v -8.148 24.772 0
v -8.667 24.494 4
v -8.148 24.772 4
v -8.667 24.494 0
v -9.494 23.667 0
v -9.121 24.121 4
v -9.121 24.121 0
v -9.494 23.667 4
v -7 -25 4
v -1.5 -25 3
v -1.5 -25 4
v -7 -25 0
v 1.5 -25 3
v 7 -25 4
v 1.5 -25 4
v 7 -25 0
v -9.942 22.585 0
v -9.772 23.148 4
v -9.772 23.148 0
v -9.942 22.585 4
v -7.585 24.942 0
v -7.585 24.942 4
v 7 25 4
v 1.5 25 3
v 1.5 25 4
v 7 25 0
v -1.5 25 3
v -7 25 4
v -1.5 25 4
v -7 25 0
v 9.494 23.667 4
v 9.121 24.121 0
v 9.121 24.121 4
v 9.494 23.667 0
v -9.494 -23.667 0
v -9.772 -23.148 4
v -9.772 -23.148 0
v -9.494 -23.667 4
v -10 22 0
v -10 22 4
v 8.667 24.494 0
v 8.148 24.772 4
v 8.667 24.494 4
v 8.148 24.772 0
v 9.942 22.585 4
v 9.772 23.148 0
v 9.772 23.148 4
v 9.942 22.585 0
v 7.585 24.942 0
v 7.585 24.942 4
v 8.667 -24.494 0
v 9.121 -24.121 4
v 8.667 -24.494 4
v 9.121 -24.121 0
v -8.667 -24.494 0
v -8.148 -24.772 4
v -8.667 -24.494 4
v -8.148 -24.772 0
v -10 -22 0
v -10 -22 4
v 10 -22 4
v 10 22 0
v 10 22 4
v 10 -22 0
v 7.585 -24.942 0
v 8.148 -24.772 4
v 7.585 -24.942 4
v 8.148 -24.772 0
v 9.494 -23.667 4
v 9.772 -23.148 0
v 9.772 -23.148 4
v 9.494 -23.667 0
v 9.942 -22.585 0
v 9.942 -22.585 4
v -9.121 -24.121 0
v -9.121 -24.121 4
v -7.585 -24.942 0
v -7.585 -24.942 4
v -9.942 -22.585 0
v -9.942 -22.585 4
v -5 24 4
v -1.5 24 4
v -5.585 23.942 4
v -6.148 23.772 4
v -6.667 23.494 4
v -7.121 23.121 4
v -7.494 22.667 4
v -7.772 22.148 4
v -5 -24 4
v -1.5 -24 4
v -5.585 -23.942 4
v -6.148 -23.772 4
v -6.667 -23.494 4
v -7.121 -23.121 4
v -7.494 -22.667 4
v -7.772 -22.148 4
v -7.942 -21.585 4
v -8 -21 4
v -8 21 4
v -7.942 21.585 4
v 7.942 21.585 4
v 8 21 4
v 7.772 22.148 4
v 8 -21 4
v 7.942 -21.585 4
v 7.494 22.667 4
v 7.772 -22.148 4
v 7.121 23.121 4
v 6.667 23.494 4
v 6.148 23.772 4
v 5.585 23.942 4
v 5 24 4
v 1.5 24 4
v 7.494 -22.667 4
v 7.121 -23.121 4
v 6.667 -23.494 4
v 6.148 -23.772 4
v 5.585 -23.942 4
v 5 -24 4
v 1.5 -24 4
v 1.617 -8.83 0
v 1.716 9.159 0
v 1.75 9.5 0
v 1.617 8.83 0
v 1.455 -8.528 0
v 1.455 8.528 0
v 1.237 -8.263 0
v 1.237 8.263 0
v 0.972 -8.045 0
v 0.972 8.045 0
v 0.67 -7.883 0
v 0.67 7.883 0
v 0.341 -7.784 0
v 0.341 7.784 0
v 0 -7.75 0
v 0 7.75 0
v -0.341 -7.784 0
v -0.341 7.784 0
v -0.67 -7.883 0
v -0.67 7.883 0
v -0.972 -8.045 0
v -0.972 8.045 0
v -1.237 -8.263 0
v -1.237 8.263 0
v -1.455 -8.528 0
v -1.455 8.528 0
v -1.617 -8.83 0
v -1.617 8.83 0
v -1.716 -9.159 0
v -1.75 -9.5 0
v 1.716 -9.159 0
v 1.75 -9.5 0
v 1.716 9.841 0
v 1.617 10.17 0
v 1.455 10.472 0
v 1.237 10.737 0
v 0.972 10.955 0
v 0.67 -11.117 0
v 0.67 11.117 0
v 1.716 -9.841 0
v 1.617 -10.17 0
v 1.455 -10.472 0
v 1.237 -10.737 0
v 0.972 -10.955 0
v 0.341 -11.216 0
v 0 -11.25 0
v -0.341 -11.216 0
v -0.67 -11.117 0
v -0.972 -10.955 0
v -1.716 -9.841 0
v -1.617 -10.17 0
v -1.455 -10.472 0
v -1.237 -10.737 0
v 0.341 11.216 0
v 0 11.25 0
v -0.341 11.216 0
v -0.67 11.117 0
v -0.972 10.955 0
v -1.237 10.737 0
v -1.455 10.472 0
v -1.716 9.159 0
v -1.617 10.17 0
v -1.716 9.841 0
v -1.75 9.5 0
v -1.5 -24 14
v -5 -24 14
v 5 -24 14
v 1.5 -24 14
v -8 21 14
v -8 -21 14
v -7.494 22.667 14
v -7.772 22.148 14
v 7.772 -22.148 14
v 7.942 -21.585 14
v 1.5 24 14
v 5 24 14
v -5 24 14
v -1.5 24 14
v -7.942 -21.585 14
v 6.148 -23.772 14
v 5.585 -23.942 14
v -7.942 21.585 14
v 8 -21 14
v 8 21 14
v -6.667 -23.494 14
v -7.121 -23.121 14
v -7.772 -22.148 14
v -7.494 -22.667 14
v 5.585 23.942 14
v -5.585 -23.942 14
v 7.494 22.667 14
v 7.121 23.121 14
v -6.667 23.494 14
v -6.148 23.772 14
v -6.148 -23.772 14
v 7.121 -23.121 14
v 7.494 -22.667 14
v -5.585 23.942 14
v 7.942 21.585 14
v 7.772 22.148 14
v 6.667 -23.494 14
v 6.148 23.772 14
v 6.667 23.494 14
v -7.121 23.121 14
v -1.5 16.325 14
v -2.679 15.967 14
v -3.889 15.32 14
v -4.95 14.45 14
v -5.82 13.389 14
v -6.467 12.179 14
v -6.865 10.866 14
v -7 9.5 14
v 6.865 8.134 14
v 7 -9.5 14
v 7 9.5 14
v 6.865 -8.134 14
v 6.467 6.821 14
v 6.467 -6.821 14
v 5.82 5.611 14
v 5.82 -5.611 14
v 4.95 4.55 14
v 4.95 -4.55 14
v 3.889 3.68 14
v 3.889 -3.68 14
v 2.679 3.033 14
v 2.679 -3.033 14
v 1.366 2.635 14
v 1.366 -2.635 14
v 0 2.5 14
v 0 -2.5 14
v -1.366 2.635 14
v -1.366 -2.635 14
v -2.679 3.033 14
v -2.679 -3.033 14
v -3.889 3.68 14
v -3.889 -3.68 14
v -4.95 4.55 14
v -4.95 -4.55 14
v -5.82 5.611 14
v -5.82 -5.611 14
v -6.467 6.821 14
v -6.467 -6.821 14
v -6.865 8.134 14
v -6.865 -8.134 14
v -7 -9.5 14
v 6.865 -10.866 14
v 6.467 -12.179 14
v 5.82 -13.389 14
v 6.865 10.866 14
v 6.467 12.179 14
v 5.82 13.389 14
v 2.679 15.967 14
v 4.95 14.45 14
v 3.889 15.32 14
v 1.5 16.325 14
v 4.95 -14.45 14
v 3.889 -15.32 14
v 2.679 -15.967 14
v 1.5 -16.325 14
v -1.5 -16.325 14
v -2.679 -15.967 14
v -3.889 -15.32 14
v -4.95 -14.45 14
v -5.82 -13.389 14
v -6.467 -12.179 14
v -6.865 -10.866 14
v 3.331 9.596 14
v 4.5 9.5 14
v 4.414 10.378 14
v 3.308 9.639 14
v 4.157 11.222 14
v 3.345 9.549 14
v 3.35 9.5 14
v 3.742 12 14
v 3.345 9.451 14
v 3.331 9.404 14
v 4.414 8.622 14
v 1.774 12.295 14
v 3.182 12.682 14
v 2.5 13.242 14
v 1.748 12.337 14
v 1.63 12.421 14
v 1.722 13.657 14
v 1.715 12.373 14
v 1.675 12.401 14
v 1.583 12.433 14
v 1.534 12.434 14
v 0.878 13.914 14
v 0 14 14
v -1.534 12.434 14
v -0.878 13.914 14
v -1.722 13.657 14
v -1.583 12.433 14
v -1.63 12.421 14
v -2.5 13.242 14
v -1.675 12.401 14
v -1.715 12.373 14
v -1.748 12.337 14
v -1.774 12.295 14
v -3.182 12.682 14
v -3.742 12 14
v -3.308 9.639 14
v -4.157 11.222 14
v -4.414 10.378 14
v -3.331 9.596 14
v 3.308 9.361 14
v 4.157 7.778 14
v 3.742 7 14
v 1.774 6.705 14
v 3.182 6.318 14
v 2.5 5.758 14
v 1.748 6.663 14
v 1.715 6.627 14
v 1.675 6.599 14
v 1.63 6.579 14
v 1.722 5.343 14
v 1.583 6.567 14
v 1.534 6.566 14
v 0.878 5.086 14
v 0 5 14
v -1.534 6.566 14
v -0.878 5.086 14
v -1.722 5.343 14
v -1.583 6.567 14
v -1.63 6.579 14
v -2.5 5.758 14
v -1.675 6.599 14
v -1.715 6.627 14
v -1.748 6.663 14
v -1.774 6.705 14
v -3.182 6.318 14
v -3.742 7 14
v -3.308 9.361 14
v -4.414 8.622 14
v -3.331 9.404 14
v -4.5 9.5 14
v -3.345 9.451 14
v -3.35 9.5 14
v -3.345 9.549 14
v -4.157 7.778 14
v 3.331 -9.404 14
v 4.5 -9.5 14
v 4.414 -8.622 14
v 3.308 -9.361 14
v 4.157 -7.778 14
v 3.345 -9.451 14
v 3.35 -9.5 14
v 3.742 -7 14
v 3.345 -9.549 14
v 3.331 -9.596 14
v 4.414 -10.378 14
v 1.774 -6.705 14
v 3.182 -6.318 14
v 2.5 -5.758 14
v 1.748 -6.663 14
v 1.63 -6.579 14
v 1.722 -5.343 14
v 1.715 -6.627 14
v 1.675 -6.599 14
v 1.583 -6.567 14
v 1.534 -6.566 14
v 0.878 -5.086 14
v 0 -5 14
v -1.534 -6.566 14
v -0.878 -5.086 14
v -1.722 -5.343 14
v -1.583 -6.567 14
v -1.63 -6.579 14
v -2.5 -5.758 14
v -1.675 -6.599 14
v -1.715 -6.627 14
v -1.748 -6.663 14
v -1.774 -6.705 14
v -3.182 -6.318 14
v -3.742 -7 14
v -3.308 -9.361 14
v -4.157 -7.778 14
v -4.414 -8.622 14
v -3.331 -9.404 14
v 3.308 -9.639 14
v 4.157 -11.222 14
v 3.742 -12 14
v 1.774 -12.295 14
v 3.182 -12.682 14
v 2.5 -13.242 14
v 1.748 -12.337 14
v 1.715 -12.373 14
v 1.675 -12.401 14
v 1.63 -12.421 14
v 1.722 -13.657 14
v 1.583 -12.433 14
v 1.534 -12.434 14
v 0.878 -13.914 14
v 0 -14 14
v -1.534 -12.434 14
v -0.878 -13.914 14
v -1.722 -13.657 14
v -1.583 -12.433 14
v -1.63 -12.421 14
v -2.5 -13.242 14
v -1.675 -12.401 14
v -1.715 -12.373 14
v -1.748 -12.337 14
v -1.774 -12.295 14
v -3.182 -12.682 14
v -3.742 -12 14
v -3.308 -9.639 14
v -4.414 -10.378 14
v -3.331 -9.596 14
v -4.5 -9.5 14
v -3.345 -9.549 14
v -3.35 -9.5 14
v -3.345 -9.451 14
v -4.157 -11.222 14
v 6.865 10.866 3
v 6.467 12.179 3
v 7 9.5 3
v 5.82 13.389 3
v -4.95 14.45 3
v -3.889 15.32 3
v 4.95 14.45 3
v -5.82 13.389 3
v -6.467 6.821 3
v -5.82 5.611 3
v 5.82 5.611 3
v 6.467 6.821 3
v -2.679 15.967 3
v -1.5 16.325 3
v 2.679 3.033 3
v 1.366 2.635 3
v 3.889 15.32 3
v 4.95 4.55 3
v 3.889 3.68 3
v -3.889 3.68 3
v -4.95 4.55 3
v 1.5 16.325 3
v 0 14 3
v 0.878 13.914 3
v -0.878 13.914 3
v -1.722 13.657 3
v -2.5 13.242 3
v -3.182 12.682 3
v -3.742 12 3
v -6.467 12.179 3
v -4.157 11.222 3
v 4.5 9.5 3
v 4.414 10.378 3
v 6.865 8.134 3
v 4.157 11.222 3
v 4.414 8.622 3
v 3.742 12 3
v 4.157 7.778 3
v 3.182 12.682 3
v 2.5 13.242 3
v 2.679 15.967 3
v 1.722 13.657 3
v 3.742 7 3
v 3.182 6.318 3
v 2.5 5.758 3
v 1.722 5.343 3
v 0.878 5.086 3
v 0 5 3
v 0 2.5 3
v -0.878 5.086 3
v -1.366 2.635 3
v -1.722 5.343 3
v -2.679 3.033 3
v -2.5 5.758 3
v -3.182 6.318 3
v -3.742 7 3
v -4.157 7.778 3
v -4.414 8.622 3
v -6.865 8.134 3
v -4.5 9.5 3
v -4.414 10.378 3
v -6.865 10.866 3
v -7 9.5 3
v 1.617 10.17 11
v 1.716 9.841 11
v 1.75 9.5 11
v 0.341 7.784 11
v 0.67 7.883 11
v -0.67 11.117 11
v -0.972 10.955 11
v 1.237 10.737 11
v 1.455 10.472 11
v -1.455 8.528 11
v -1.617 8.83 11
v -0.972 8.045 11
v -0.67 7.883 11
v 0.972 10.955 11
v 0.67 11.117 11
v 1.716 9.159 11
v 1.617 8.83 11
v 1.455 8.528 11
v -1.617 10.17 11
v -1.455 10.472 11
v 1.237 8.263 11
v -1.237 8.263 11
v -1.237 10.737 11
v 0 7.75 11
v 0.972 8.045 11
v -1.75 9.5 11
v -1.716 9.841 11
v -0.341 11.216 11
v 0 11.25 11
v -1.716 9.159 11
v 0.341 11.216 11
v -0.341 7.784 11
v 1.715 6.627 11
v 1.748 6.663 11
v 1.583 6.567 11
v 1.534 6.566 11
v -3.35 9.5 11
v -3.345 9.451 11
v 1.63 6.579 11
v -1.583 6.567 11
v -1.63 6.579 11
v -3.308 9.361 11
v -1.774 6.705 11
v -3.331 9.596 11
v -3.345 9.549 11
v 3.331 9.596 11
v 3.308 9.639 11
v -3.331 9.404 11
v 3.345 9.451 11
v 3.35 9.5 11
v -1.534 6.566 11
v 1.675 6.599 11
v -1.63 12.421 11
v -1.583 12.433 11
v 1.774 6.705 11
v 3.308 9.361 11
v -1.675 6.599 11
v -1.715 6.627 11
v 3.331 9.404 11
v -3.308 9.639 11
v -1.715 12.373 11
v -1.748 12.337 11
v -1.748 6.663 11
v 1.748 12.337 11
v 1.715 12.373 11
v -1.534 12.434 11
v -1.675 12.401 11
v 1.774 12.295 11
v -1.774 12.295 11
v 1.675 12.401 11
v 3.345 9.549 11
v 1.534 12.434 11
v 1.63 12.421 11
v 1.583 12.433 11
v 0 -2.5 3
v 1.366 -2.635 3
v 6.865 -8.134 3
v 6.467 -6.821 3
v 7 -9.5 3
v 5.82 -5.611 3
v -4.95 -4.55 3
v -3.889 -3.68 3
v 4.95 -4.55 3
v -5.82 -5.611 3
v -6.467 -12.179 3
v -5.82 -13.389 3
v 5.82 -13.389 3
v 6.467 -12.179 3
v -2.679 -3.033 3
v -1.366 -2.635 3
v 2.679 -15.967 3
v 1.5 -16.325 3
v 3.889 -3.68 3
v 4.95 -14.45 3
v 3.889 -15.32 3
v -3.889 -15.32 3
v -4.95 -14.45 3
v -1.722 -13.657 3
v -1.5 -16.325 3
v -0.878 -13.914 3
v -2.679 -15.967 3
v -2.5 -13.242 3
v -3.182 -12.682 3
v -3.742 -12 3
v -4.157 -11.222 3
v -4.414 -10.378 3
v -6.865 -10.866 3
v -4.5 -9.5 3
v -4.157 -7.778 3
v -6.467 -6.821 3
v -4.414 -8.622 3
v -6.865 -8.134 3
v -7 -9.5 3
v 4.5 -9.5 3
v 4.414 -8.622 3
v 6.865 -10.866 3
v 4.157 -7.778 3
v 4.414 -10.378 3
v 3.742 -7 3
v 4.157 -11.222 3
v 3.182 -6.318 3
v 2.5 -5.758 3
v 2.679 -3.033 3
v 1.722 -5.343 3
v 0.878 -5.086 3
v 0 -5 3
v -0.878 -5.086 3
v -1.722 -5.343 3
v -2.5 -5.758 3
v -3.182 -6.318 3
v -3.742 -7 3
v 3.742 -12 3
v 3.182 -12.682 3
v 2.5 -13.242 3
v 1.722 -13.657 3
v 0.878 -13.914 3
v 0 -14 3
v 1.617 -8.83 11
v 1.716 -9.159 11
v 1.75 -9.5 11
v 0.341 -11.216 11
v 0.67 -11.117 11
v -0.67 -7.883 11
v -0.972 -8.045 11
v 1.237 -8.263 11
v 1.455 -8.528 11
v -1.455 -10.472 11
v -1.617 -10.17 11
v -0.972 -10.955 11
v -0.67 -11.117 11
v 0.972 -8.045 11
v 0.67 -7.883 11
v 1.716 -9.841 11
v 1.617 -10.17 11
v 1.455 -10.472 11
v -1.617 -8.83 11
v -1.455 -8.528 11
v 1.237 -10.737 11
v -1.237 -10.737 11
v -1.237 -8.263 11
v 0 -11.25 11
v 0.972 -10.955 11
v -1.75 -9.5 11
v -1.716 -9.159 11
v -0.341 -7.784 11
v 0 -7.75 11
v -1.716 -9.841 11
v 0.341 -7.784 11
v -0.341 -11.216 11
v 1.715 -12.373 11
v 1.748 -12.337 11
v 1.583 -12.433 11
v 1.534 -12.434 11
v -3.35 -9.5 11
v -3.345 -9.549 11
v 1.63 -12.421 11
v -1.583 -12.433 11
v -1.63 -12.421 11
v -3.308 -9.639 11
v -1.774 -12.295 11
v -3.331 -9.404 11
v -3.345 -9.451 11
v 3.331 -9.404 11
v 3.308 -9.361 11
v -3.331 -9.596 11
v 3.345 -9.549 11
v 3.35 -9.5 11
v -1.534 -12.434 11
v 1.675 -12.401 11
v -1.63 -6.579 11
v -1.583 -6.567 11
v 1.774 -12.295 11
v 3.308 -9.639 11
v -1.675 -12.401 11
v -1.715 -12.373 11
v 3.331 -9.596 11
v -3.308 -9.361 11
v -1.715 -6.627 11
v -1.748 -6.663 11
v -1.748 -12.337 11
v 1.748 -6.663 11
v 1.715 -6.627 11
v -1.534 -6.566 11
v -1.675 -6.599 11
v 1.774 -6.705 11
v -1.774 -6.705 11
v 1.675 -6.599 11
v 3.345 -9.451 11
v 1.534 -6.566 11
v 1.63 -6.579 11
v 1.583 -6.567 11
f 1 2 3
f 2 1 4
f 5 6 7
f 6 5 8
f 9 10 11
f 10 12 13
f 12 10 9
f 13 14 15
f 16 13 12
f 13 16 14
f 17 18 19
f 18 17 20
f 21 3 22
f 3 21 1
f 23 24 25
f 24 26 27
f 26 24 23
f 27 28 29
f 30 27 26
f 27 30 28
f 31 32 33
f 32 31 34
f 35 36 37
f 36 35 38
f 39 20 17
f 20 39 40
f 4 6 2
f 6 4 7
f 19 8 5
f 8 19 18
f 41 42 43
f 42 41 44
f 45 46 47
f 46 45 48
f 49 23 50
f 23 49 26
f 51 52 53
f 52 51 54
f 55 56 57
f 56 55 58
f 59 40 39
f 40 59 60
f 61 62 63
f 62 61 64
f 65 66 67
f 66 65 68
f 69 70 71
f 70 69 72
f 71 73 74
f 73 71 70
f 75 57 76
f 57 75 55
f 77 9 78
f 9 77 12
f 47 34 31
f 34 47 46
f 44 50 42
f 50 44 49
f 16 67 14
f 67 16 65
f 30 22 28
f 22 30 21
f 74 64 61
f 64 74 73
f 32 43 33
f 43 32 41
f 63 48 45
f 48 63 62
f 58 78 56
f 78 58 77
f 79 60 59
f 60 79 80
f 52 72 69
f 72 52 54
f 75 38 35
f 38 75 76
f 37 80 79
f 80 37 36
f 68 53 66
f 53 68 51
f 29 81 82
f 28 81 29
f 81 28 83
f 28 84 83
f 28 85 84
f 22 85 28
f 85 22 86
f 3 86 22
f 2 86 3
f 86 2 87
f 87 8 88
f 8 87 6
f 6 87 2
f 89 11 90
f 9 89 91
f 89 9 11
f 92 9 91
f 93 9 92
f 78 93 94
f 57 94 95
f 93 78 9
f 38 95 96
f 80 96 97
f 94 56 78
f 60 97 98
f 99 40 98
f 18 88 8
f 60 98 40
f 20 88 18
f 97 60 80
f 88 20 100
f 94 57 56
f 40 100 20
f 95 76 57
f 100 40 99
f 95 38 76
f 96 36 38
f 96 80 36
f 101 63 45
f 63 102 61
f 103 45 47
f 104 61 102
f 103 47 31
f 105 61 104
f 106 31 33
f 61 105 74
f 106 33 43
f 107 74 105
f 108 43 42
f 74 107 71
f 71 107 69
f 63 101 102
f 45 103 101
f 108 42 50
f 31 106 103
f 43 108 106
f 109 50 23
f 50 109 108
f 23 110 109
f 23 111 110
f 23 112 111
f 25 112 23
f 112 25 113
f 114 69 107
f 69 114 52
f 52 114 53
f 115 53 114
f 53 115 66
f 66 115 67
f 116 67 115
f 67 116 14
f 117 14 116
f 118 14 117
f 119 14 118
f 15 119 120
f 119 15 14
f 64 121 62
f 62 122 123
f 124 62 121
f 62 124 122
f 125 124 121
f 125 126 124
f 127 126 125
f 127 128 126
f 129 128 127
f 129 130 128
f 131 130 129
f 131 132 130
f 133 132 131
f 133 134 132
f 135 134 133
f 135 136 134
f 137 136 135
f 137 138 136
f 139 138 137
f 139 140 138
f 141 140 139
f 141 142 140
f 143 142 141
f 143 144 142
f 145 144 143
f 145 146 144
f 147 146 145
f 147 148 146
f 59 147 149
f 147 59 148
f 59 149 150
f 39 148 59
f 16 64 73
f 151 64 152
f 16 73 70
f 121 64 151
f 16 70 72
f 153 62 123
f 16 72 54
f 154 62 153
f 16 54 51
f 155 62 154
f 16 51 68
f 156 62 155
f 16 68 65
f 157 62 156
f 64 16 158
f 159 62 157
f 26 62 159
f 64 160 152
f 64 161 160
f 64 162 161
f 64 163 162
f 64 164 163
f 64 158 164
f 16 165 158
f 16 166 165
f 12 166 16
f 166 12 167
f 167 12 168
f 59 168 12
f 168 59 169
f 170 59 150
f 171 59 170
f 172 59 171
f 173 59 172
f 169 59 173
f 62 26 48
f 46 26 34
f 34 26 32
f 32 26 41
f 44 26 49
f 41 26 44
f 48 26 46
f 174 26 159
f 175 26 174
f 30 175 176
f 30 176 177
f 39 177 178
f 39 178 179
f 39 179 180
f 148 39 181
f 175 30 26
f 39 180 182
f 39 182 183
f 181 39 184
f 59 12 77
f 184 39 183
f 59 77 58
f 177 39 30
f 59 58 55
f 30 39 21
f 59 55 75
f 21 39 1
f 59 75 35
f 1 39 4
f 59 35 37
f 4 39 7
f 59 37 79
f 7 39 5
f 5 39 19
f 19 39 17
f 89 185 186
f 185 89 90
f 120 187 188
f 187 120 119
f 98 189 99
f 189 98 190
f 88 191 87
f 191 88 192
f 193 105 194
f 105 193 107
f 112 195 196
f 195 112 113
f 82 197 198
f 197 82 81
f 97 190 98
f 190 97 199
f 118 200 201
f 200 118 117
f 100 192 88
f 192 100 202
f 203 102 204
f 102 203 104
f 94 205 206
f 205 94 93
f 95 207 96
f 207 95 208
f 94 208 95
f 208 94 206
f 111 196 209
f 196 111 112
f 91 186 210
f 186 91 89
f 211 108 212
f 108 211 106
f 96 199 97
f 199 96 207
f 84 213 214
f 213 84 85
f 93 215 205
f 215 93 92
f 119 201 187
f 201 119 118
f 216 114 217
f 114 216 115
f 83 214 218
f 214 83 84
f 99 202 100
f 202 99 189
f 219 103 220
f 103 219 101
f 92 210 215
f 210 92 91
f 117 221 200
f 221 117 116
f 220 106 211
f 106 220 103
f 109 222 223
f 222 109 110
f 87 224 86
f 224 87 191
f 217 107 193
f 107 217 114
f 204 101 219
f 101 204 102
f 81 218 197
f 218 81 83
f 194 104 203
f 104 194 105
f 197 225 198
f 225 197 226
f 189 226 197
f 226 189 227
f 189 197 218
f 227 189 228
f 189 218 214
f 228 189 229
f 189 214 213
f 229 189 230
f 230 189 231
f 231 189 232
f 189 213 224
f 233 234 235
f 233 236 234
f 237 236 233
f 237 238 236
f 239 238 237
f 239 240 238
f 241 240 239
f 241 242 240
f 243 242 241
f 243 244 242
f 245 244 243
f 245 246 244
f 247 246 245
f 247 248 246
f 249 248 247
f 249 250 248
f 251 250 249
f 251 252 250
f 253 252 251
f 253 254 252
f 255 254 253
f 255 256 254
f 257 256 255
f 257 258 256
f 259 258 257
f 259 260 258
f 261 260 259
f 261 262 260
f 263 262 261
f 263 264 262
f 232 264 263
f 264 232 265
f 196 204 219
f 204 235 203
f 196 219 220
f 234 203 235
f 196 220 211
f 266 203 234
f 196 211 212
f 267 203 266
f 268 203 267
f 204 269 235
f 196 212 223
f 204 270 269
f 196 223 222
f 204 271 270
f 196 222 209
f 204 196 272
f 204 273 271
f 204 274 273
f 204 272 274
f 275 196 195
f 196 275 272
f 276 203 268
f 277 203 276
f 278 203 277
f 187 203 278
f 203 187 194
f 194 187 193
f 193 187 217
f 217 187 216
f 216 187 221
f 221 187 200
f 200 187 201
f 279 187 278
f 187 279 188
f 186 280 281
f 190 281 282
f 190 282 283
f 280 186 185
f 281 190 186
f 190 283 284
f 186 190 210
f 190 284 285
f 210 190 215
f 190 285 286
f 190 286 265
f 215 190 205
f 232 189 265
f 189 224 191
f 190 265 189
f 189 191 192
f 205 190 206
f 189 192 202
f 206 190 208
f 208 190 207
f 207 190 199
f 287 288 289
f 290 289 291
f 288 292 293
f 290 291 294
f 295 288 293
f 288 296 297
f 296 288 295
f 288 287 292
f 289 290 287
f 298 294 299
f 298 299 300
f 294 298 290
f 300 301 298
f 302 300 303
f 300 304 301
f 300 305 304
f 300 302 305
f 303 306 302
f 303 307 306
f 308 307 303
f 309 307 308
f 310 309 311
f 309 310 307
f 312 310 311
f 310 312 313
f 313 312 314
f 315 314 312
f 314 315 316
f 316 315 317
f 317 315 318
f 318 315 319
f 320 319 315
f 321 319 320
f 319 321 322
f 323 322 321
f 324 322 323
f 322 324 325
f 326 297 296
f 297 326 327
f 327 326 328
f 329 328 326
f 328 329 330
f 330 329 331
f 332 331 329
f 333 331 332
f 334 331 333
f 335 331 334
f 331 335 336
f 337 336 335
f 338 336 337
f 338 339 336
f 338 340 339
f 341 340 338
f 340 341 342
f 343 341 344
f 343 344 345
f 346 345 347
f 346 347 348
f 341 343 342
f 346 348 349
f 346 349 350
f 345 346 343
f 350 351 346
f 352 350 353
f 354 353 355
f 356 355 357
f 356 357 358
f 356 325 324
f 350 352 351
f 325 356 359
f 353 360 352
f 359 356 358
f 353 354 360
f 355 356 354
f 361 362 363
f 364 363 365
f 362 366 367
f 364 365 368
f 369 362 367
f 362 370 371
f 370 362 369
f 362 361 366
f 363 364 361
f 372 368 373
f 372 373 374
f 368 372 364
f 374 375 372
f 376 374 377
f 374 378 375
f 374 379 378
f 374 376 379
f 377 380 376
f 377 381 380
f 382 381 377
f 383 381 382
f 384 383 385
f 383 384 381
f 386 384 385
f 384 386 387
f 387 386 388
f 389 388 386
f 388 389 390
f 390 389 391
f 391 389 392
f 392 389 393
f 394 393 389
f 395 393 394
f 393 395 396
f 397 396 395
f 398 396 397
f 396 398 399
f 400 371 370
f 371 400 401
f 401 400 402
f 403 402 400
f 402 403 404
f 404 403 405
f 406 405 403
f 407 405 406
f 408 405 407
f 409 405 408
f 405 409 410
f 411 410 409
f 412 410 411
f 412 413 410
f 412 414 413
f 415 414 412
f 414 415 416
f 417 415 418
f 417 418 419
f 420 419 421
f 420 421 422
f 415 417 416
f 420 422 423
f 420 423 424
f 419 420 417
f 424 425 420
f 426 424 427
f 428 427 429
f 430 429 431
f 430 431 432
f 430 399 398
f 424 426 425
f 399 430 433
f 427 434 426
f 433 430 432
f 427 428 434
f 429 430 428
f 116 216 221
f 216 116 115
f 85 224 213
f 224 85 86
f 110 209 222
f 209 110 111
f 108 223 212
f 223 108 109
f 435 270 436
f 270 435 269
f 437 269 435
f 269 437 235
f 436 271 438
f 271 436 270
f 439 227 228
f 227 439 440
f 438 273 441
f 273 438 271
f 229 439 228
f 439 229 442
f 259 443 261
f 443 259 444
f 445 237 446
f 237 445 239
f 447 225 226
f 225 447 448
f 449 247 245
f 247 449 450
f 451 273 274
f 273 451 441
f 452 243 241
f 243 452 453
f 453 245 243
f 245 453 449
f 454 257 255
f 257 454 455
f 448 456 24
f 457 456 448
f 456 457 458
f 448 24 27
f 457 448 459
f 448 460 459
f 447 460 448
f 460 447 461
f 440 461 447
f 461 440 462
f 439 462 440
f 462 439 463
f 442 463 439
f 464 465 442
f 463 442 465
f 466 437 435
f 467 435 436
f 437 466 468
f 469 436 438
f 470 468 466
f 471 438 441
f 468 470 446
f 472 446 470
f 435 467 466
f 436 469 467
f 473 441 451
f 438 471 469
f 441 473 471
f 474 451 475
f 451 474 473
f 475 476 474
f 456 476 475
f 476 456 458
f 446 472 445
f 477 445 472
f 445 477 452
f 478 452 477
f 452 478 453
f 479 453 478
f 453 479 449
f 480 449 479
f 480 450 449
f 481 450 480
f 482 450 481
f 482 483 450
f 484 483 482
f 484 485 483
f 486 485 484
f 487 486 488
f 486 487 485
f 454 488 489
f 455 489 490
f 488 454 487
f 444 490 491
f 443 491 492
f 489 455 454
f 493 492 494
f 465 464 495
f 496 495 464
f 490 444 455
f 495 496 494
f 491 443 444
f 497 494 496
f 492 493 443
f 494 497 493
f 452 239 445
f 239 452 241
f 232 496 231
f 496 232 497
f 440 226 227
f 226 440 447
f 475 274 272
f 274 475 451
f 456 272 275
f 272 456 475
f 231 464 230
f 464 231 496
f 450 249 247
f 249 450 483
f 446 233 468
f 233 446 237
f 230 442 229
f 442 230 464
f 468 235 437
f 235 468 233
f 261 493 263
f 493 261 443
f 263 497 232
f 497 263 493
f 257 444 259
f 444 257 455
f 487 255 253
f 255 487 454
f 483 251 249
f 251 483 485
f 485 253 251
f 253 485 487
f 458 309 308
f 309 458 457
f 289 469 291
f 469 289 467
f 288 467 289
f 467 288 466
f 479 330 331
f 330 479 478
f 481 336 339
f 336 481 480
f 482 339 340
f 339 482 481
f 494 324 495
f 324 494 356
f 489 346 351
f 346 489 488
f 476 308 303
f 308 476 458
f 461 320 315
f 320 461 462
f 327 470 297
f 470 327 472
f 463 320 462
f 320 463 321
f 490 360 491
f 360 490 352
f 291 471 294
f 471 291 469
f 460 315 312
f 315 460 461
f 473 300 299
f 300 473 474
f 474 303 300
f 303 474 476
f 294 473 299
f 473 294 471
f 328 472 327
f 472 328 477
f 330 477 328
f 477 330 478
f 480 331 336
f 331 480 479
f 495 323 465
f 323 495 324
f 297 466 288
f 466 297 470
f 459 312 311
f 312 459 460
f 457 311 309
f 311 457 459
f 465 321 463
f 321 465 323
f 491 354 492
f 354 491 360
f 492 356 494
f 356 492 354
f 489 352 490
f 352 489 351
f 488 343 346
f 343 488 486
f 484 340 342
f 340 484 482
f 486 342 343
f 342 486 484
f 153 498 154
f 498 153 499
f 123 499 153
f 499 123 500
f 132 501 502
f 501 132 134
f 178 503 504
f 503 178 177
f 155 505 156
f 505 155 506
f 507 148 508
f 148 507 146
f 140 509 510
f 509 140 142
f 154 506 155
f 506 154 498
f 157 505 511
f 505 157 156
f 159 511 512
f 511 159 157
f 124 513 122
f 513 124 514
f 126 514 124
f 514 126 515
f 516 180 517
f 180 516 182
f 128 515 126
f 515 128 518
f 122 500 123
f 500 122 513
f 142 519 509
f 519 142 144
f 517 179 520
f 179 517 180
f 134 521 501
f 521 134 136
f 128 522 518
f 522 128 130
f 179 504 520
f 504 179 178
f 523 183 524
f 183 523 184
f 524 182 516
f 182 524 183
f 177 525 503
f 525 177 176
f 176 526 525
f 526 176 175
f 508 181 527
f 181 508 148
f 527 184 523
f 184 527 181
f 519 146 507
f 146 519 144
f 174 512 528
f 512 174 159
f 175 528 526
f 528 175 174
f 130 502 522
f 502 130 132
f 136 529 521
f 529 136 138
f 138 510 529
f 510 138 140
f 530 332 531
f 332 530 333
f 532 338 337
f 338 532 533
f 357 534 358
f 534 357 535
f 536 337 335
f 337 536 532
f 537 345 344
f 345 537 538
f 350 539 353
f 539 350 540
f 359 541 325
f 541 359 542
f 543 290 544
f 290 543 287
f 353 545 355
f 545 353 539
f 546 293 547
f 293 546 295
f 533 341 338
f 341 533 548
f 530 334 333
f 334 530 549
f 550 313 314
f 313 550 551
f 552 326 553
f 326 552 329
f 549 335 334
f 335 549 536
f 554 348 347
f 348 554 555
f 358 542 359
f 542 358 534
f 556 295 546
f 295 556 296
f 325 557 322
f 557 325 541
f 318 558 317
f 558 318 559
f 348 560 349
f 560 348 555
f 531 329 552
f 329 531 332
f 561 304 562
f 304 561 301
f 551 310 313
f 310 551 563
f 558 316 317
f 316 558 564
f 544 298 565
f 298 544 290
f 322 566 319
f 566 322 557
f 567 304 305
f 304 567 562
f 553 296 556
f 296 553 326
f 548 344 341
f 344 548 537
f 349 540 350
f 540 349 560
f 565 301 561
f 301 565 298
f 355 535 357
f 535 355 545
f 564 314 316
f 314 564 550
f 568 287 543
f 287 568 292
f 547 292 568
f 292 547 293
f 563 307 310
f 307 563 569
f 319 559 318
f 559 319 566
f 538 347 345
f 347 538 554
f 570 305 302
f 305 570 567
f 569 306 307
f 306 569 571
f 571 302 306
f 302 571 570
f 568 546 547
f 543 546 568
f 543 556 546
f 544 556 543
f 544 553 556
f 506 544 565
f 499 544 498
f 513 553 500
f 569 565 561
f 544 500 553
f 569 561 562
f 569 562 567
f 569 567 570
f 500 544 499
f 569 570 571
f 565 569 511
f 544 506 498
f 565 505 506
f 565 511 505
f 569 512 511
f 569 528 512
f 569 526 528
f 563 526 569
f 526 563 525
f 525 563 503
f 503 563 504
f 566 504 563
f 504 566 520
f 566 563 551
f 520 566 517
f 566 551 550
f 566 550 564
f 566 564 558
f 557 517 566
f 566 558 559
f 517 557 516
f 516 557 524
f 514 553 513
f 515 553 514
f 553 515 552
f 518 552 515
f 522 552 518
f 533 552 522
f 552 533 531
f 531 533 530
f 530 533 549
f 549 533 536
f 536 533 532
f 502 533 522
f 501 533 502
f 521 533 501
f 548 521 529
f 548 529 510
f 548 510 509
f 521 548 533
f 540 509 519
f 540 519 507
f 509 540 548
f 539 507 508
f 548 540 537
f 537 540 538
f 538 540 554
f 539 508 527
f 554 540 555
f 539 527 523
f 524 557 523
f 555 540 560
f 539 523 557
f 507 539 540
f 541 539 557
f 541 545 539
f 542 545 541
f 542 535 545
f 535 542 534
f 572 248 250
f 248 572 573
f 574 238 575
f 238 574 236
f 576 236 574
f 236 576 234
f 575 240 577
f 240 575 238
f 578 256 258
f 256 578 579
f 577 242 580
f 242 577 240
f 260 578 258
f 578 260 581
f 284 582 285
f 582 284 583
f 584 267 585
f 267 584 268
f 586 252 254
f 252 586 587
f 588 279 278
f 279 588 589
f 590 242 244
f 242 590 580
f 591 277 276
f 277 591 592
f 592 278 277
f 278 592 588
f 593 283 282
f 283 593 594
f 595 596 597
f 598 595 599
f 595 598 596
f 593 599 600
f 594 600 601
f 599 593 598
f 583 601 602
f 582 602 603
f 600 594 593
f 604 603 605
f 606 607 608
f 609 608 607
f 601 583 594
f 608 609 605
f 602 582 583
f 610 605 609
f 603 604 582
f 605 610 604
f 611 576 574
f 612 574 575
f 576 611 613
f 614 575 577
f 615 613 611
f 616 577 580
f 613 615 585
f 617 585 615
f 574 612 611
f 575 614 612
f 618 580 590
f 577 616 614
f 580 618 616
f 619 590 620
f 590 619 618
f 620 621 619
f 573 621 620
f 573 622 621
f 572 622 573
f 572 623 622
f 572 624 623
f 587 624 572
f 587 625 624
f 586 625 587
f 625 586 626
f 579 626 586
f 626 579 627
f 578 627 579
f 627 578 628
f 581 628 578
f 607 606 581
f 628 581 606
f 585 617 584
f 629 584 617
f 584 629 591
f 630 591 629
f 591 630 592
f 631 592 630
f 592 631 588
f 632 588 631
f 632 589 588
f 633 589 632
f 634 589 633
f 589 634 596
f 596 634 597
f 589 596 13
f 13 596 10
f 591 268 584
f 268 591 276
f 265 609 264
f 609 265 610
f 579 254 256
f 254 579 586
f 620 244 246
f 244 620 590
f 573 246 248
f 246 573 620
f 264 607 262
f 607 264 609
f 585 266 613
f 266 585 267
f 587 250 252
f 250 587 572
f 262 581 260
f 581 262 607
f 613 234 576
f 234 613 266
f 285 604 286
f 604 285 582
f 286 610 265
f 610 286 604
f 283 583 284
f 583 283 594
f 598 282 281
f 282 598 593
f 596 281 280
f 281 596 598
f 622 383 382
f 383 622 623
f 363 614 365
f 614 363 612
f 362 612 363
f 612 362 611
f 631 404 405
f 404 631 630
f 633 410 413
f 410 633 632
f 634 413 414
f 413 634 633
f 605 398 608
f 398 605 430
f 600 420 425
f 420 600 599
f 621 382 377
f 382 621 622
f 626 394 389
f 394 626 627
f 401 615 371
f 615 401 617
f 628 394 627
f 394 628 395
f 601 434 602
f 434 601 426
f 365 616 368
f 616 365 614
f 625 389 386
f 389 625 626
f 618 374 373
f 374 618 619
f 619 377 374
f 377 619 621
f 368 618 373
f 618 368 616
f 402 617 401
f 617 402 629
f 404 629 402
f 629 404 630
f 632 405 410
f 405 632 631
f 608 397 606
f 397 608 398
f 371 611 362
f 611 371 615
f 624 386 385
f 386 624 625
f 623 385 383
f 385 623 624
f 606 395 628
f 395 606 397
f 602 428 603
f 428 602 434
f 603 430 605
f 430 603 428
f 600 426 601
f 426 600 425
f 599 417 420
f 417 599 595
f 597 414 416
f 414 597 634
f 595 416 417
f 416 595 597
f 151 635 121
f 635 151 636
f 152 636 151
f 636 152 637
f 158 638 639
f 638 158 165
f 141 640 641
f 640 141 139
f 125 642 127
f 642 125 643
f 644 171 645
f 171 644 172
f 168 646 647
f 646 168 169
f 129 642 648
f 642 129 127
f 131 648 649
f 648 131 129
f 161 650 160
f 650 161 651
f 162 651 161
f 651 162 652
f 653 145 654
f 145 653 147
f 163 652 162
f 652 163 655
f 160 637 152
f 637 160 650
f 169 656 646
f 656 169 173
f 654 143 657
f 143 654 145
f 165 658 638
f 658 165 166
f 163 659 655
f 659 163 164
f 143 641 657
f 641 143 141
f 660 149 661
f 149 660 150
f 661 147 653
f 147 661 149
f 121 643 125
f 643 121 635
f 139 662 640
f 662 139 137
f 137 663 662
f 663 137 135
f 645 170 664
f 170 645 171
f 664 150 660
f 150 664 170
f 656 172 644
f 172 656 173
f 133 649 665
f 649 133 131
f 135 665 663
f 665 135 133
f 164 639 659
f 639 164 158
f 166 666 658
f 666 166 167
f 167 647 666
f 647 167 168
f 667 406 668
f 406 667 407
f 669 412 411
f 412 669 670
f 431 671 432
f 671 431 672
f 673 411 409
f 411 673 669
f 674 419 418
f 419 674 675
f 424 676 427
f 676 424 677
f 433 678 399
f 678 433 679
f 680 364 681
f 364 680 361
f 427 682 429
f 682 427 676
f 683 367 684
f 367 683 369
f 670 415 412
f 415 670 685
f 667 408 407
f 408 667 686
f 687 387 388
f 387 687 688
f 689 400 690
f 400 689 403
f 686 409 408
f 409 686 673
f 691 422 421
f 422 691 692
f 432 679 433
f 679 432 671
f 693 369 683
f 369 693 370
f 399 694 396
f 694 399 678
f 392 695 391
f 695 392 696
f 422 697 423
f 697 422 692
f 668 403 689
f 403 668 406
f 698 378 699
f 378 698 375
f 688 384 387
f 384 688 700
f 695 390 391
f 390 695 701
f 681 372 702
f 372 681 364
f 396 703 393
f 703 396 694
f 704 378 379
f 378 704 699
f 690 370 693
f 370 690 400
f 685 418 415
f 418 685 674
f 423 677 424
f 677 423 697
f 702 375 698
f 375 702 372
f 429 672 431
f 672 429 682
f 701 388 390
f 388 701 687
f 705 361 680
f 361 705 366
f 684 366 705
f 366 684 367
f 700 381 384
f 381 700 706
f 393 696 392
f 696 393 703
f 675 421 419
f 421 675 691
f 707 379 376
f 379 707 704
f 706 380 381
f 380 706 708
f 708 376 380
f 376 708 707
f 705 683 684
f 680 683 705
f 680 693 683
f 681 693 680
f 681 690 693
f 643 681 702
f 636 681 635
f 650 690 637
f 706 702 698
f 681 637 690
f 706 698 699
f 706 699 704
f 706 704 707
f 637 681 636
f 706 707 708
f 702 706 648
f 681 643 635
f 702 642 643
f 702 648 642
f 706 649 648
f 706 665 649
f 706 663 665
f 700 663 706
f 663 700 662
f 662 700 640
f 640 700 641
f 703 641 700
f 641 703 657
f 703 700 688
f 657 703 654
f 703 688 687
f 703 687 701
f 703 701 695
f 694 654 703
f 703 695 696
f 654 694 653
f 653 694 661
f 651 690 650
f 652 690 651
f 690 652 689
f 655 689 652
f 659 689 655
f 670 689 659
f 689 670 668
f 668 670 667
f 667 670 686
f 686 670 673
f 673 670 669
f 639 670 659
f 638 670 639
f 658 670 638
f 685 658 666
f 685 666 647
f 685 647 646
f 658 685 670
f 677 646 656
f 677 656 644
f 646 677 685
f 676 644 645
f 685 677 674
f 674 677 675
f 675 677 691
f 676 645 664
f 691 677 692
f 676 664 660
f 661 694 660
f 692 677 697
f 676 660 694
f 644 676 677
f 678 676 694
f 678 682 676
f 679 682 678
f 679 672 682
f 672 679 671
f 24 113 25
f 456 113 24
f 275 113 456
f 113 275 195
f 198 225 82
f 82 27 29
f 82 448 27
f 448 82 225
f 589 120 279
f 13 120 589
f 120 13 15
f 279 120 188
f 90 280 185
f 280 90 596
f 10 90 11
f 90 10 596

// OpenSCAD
$fn=32;

module nut3(h=50) {
    hull() {
        translate([3.1,0,0]) cylinder(d=0.5,h=4);
        rotate([0,0,60]) translate([3.1,0,0]) cylinder(d=0.5,h=4);
        rotate([0,0,120]) translate([3.1,0,0]) cylinder(d=0.5,h=4);
        rotate([0,0,180]) translate([3.1,0,0]) cylinder(d=0.5,h=4);
        rotate([0,0,240]) translate([3.1,0,0]) cylinder(d=0.5,h=4);
        rotate([0,0,300]) translate([3.1,0,0]) cylinder(d=0.5,h=4);
    }
}

module ycarriage() {
    difference() {
        union() {
            hull() {
                translate([-7,-22,0]) cylinder(d=6,h=4);
                translate([-7,22,0]) cylinder(d=6,h=4);
                translate([7,-22,0]) cylinder(d=6,h=4);
                translate([7,22,0]) cylinder(d=6,h=4);
            }
            hull() {
                translate([-5,-21,0]) cylinder(d=6,h=14);
                translate([-5,21,0]) cylinder(d=6,h=14);
                translate([5,-21,0]) cylinder(d=6,h=14);
                translate([5,21,0]) cylinder(d=6,h=14);
            }
        }
        
        translate([0,9.5,0]) {
            translate([0,0,3]) difference() {
                cylinder(d=14,h=12);
                cylinder(d=9,h=13);
            }
            translate([0,0,-1]) cylinder(d=3.5,h=30);
            translate([0,0,11]) nut3();
        }
        translate([-1.5,15,3]) cube([3,20,12]);
        
        translate([0,-9.5,0]) {
            translate([0,0,3]) difference() {
                cylinder(d=14,h=12);
                cylinder(d=9,h=13);
            }
            translate([0,0,-1]) cylinder(d=3.5,h=30);
            translate([0,0,11]) nut3();
        }
        translate([-1.5,-35,3]) cube([3,20,12]);
    }
}

ycarriage();
